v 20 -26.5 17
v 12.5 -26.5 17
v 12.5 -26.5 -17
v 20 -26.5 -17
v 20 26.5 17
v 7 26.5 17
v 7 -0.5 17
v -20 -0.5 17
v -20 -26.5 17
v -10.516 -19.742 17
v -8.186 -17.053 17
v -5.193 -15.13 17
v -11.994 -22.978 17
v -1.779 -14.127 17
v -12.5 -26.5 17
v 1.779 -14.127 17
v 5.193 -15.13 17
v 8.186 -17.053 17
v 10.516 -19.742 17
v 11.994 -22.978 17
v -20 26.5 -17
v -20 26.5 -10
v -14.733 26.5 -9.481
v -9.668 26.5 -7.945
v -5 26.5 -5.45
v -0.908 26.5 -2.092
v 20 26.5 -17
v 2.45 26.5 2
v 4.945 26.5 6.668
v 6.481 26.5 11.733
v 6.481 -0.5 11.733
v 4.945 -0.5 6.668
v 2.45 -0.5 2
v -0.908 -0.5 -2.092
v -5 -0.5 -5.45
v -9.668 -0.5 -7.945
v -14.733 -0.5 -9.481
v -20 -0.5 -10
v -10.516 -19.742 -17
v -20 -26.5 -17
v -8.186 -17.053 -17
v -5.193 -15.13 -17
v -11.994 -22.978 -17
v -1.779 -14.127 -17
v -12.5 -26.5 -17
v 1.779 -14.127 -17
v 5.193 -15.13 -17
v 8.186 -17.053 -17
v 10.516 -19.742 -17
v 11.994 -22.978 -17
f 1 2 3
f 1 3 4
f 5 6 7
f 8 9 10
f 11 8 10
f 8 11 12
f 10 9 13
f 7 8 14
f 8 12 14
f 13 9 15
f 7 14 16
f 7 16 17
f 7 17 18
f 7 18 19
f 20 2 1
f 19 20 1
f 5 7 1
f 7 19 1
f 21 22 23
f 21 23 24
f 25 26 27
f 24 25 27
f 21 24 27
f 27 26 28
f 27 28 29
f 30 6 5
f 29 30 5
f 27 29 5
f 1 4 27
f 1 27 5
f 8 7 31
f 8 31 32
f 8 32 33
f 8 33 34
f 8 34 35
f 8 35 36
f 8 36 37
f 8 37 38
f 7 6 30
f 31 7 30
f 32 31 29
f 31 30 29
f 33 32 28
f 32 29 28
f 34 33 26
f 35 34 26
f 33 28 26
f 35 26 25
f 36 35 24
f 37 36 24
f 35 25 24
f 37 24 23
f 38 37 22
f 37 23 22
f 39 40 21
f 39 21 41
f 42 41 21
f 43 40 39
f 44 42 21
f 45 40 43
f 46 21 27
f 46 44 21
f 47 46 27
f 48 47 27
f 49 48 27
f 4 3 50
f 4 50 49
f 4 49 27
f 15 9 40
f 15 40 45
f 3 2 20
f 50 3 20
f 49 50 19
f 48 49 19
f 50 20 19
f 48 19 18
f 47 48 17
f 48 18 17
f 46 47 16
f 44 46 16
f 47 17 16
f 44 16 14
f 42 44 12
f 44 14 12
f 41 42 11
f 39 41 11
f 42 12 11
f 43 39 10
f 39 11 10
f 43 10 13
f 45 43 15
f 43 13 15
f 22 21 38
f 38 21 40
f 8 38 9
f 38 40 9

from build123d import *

# Parameters (mm, degrees)
F0_W     = 40
F0_H     = 34
F1_DEPTH = 26.5
F3_DEPTH = 34.001
F5_DEPTH = 27


with BuildPart() as f1:
    # F0 (on Front) → F1 (new body, symmetric)
    with BuildSketch(Plane.XZ):
        Rectangle(F0_W, F0_H)
    extrude(amount=F1_DEPTH, both=True)

    # F2 (on face) → F3 (cut, through all)
    with BuildSketch(Plane.XY.offset(17)):
        with BuildLine():
            Line((-12.5, -26.5), (12.5, -26.5))
            ThreePointArc((12.5, -26.5), (0, -14), (-12.5, -26.5))
        make_face()
    extrude(amount=-F3_DEPTH, mode=Mode.SUBTRACT)

    # F4 (on face) → F5 (cut)
    with BuildSketch(Plane(origin=(0, 26.5, 0), x_dir=(-1, 0, 0), z_dir=(0, 1, 0))):
        with BuildLine():
            Line((20, 17), (-7, 17))
            ThreePointArc((-7, 17), (0.908116908, -2.091883092), (20, -10))
            Line((20, -10), (20, 17))
        make_face()
    extrude(amount=-F5_DEPTH, mode=Mode.SUBTRACT)


solid = f1.part
